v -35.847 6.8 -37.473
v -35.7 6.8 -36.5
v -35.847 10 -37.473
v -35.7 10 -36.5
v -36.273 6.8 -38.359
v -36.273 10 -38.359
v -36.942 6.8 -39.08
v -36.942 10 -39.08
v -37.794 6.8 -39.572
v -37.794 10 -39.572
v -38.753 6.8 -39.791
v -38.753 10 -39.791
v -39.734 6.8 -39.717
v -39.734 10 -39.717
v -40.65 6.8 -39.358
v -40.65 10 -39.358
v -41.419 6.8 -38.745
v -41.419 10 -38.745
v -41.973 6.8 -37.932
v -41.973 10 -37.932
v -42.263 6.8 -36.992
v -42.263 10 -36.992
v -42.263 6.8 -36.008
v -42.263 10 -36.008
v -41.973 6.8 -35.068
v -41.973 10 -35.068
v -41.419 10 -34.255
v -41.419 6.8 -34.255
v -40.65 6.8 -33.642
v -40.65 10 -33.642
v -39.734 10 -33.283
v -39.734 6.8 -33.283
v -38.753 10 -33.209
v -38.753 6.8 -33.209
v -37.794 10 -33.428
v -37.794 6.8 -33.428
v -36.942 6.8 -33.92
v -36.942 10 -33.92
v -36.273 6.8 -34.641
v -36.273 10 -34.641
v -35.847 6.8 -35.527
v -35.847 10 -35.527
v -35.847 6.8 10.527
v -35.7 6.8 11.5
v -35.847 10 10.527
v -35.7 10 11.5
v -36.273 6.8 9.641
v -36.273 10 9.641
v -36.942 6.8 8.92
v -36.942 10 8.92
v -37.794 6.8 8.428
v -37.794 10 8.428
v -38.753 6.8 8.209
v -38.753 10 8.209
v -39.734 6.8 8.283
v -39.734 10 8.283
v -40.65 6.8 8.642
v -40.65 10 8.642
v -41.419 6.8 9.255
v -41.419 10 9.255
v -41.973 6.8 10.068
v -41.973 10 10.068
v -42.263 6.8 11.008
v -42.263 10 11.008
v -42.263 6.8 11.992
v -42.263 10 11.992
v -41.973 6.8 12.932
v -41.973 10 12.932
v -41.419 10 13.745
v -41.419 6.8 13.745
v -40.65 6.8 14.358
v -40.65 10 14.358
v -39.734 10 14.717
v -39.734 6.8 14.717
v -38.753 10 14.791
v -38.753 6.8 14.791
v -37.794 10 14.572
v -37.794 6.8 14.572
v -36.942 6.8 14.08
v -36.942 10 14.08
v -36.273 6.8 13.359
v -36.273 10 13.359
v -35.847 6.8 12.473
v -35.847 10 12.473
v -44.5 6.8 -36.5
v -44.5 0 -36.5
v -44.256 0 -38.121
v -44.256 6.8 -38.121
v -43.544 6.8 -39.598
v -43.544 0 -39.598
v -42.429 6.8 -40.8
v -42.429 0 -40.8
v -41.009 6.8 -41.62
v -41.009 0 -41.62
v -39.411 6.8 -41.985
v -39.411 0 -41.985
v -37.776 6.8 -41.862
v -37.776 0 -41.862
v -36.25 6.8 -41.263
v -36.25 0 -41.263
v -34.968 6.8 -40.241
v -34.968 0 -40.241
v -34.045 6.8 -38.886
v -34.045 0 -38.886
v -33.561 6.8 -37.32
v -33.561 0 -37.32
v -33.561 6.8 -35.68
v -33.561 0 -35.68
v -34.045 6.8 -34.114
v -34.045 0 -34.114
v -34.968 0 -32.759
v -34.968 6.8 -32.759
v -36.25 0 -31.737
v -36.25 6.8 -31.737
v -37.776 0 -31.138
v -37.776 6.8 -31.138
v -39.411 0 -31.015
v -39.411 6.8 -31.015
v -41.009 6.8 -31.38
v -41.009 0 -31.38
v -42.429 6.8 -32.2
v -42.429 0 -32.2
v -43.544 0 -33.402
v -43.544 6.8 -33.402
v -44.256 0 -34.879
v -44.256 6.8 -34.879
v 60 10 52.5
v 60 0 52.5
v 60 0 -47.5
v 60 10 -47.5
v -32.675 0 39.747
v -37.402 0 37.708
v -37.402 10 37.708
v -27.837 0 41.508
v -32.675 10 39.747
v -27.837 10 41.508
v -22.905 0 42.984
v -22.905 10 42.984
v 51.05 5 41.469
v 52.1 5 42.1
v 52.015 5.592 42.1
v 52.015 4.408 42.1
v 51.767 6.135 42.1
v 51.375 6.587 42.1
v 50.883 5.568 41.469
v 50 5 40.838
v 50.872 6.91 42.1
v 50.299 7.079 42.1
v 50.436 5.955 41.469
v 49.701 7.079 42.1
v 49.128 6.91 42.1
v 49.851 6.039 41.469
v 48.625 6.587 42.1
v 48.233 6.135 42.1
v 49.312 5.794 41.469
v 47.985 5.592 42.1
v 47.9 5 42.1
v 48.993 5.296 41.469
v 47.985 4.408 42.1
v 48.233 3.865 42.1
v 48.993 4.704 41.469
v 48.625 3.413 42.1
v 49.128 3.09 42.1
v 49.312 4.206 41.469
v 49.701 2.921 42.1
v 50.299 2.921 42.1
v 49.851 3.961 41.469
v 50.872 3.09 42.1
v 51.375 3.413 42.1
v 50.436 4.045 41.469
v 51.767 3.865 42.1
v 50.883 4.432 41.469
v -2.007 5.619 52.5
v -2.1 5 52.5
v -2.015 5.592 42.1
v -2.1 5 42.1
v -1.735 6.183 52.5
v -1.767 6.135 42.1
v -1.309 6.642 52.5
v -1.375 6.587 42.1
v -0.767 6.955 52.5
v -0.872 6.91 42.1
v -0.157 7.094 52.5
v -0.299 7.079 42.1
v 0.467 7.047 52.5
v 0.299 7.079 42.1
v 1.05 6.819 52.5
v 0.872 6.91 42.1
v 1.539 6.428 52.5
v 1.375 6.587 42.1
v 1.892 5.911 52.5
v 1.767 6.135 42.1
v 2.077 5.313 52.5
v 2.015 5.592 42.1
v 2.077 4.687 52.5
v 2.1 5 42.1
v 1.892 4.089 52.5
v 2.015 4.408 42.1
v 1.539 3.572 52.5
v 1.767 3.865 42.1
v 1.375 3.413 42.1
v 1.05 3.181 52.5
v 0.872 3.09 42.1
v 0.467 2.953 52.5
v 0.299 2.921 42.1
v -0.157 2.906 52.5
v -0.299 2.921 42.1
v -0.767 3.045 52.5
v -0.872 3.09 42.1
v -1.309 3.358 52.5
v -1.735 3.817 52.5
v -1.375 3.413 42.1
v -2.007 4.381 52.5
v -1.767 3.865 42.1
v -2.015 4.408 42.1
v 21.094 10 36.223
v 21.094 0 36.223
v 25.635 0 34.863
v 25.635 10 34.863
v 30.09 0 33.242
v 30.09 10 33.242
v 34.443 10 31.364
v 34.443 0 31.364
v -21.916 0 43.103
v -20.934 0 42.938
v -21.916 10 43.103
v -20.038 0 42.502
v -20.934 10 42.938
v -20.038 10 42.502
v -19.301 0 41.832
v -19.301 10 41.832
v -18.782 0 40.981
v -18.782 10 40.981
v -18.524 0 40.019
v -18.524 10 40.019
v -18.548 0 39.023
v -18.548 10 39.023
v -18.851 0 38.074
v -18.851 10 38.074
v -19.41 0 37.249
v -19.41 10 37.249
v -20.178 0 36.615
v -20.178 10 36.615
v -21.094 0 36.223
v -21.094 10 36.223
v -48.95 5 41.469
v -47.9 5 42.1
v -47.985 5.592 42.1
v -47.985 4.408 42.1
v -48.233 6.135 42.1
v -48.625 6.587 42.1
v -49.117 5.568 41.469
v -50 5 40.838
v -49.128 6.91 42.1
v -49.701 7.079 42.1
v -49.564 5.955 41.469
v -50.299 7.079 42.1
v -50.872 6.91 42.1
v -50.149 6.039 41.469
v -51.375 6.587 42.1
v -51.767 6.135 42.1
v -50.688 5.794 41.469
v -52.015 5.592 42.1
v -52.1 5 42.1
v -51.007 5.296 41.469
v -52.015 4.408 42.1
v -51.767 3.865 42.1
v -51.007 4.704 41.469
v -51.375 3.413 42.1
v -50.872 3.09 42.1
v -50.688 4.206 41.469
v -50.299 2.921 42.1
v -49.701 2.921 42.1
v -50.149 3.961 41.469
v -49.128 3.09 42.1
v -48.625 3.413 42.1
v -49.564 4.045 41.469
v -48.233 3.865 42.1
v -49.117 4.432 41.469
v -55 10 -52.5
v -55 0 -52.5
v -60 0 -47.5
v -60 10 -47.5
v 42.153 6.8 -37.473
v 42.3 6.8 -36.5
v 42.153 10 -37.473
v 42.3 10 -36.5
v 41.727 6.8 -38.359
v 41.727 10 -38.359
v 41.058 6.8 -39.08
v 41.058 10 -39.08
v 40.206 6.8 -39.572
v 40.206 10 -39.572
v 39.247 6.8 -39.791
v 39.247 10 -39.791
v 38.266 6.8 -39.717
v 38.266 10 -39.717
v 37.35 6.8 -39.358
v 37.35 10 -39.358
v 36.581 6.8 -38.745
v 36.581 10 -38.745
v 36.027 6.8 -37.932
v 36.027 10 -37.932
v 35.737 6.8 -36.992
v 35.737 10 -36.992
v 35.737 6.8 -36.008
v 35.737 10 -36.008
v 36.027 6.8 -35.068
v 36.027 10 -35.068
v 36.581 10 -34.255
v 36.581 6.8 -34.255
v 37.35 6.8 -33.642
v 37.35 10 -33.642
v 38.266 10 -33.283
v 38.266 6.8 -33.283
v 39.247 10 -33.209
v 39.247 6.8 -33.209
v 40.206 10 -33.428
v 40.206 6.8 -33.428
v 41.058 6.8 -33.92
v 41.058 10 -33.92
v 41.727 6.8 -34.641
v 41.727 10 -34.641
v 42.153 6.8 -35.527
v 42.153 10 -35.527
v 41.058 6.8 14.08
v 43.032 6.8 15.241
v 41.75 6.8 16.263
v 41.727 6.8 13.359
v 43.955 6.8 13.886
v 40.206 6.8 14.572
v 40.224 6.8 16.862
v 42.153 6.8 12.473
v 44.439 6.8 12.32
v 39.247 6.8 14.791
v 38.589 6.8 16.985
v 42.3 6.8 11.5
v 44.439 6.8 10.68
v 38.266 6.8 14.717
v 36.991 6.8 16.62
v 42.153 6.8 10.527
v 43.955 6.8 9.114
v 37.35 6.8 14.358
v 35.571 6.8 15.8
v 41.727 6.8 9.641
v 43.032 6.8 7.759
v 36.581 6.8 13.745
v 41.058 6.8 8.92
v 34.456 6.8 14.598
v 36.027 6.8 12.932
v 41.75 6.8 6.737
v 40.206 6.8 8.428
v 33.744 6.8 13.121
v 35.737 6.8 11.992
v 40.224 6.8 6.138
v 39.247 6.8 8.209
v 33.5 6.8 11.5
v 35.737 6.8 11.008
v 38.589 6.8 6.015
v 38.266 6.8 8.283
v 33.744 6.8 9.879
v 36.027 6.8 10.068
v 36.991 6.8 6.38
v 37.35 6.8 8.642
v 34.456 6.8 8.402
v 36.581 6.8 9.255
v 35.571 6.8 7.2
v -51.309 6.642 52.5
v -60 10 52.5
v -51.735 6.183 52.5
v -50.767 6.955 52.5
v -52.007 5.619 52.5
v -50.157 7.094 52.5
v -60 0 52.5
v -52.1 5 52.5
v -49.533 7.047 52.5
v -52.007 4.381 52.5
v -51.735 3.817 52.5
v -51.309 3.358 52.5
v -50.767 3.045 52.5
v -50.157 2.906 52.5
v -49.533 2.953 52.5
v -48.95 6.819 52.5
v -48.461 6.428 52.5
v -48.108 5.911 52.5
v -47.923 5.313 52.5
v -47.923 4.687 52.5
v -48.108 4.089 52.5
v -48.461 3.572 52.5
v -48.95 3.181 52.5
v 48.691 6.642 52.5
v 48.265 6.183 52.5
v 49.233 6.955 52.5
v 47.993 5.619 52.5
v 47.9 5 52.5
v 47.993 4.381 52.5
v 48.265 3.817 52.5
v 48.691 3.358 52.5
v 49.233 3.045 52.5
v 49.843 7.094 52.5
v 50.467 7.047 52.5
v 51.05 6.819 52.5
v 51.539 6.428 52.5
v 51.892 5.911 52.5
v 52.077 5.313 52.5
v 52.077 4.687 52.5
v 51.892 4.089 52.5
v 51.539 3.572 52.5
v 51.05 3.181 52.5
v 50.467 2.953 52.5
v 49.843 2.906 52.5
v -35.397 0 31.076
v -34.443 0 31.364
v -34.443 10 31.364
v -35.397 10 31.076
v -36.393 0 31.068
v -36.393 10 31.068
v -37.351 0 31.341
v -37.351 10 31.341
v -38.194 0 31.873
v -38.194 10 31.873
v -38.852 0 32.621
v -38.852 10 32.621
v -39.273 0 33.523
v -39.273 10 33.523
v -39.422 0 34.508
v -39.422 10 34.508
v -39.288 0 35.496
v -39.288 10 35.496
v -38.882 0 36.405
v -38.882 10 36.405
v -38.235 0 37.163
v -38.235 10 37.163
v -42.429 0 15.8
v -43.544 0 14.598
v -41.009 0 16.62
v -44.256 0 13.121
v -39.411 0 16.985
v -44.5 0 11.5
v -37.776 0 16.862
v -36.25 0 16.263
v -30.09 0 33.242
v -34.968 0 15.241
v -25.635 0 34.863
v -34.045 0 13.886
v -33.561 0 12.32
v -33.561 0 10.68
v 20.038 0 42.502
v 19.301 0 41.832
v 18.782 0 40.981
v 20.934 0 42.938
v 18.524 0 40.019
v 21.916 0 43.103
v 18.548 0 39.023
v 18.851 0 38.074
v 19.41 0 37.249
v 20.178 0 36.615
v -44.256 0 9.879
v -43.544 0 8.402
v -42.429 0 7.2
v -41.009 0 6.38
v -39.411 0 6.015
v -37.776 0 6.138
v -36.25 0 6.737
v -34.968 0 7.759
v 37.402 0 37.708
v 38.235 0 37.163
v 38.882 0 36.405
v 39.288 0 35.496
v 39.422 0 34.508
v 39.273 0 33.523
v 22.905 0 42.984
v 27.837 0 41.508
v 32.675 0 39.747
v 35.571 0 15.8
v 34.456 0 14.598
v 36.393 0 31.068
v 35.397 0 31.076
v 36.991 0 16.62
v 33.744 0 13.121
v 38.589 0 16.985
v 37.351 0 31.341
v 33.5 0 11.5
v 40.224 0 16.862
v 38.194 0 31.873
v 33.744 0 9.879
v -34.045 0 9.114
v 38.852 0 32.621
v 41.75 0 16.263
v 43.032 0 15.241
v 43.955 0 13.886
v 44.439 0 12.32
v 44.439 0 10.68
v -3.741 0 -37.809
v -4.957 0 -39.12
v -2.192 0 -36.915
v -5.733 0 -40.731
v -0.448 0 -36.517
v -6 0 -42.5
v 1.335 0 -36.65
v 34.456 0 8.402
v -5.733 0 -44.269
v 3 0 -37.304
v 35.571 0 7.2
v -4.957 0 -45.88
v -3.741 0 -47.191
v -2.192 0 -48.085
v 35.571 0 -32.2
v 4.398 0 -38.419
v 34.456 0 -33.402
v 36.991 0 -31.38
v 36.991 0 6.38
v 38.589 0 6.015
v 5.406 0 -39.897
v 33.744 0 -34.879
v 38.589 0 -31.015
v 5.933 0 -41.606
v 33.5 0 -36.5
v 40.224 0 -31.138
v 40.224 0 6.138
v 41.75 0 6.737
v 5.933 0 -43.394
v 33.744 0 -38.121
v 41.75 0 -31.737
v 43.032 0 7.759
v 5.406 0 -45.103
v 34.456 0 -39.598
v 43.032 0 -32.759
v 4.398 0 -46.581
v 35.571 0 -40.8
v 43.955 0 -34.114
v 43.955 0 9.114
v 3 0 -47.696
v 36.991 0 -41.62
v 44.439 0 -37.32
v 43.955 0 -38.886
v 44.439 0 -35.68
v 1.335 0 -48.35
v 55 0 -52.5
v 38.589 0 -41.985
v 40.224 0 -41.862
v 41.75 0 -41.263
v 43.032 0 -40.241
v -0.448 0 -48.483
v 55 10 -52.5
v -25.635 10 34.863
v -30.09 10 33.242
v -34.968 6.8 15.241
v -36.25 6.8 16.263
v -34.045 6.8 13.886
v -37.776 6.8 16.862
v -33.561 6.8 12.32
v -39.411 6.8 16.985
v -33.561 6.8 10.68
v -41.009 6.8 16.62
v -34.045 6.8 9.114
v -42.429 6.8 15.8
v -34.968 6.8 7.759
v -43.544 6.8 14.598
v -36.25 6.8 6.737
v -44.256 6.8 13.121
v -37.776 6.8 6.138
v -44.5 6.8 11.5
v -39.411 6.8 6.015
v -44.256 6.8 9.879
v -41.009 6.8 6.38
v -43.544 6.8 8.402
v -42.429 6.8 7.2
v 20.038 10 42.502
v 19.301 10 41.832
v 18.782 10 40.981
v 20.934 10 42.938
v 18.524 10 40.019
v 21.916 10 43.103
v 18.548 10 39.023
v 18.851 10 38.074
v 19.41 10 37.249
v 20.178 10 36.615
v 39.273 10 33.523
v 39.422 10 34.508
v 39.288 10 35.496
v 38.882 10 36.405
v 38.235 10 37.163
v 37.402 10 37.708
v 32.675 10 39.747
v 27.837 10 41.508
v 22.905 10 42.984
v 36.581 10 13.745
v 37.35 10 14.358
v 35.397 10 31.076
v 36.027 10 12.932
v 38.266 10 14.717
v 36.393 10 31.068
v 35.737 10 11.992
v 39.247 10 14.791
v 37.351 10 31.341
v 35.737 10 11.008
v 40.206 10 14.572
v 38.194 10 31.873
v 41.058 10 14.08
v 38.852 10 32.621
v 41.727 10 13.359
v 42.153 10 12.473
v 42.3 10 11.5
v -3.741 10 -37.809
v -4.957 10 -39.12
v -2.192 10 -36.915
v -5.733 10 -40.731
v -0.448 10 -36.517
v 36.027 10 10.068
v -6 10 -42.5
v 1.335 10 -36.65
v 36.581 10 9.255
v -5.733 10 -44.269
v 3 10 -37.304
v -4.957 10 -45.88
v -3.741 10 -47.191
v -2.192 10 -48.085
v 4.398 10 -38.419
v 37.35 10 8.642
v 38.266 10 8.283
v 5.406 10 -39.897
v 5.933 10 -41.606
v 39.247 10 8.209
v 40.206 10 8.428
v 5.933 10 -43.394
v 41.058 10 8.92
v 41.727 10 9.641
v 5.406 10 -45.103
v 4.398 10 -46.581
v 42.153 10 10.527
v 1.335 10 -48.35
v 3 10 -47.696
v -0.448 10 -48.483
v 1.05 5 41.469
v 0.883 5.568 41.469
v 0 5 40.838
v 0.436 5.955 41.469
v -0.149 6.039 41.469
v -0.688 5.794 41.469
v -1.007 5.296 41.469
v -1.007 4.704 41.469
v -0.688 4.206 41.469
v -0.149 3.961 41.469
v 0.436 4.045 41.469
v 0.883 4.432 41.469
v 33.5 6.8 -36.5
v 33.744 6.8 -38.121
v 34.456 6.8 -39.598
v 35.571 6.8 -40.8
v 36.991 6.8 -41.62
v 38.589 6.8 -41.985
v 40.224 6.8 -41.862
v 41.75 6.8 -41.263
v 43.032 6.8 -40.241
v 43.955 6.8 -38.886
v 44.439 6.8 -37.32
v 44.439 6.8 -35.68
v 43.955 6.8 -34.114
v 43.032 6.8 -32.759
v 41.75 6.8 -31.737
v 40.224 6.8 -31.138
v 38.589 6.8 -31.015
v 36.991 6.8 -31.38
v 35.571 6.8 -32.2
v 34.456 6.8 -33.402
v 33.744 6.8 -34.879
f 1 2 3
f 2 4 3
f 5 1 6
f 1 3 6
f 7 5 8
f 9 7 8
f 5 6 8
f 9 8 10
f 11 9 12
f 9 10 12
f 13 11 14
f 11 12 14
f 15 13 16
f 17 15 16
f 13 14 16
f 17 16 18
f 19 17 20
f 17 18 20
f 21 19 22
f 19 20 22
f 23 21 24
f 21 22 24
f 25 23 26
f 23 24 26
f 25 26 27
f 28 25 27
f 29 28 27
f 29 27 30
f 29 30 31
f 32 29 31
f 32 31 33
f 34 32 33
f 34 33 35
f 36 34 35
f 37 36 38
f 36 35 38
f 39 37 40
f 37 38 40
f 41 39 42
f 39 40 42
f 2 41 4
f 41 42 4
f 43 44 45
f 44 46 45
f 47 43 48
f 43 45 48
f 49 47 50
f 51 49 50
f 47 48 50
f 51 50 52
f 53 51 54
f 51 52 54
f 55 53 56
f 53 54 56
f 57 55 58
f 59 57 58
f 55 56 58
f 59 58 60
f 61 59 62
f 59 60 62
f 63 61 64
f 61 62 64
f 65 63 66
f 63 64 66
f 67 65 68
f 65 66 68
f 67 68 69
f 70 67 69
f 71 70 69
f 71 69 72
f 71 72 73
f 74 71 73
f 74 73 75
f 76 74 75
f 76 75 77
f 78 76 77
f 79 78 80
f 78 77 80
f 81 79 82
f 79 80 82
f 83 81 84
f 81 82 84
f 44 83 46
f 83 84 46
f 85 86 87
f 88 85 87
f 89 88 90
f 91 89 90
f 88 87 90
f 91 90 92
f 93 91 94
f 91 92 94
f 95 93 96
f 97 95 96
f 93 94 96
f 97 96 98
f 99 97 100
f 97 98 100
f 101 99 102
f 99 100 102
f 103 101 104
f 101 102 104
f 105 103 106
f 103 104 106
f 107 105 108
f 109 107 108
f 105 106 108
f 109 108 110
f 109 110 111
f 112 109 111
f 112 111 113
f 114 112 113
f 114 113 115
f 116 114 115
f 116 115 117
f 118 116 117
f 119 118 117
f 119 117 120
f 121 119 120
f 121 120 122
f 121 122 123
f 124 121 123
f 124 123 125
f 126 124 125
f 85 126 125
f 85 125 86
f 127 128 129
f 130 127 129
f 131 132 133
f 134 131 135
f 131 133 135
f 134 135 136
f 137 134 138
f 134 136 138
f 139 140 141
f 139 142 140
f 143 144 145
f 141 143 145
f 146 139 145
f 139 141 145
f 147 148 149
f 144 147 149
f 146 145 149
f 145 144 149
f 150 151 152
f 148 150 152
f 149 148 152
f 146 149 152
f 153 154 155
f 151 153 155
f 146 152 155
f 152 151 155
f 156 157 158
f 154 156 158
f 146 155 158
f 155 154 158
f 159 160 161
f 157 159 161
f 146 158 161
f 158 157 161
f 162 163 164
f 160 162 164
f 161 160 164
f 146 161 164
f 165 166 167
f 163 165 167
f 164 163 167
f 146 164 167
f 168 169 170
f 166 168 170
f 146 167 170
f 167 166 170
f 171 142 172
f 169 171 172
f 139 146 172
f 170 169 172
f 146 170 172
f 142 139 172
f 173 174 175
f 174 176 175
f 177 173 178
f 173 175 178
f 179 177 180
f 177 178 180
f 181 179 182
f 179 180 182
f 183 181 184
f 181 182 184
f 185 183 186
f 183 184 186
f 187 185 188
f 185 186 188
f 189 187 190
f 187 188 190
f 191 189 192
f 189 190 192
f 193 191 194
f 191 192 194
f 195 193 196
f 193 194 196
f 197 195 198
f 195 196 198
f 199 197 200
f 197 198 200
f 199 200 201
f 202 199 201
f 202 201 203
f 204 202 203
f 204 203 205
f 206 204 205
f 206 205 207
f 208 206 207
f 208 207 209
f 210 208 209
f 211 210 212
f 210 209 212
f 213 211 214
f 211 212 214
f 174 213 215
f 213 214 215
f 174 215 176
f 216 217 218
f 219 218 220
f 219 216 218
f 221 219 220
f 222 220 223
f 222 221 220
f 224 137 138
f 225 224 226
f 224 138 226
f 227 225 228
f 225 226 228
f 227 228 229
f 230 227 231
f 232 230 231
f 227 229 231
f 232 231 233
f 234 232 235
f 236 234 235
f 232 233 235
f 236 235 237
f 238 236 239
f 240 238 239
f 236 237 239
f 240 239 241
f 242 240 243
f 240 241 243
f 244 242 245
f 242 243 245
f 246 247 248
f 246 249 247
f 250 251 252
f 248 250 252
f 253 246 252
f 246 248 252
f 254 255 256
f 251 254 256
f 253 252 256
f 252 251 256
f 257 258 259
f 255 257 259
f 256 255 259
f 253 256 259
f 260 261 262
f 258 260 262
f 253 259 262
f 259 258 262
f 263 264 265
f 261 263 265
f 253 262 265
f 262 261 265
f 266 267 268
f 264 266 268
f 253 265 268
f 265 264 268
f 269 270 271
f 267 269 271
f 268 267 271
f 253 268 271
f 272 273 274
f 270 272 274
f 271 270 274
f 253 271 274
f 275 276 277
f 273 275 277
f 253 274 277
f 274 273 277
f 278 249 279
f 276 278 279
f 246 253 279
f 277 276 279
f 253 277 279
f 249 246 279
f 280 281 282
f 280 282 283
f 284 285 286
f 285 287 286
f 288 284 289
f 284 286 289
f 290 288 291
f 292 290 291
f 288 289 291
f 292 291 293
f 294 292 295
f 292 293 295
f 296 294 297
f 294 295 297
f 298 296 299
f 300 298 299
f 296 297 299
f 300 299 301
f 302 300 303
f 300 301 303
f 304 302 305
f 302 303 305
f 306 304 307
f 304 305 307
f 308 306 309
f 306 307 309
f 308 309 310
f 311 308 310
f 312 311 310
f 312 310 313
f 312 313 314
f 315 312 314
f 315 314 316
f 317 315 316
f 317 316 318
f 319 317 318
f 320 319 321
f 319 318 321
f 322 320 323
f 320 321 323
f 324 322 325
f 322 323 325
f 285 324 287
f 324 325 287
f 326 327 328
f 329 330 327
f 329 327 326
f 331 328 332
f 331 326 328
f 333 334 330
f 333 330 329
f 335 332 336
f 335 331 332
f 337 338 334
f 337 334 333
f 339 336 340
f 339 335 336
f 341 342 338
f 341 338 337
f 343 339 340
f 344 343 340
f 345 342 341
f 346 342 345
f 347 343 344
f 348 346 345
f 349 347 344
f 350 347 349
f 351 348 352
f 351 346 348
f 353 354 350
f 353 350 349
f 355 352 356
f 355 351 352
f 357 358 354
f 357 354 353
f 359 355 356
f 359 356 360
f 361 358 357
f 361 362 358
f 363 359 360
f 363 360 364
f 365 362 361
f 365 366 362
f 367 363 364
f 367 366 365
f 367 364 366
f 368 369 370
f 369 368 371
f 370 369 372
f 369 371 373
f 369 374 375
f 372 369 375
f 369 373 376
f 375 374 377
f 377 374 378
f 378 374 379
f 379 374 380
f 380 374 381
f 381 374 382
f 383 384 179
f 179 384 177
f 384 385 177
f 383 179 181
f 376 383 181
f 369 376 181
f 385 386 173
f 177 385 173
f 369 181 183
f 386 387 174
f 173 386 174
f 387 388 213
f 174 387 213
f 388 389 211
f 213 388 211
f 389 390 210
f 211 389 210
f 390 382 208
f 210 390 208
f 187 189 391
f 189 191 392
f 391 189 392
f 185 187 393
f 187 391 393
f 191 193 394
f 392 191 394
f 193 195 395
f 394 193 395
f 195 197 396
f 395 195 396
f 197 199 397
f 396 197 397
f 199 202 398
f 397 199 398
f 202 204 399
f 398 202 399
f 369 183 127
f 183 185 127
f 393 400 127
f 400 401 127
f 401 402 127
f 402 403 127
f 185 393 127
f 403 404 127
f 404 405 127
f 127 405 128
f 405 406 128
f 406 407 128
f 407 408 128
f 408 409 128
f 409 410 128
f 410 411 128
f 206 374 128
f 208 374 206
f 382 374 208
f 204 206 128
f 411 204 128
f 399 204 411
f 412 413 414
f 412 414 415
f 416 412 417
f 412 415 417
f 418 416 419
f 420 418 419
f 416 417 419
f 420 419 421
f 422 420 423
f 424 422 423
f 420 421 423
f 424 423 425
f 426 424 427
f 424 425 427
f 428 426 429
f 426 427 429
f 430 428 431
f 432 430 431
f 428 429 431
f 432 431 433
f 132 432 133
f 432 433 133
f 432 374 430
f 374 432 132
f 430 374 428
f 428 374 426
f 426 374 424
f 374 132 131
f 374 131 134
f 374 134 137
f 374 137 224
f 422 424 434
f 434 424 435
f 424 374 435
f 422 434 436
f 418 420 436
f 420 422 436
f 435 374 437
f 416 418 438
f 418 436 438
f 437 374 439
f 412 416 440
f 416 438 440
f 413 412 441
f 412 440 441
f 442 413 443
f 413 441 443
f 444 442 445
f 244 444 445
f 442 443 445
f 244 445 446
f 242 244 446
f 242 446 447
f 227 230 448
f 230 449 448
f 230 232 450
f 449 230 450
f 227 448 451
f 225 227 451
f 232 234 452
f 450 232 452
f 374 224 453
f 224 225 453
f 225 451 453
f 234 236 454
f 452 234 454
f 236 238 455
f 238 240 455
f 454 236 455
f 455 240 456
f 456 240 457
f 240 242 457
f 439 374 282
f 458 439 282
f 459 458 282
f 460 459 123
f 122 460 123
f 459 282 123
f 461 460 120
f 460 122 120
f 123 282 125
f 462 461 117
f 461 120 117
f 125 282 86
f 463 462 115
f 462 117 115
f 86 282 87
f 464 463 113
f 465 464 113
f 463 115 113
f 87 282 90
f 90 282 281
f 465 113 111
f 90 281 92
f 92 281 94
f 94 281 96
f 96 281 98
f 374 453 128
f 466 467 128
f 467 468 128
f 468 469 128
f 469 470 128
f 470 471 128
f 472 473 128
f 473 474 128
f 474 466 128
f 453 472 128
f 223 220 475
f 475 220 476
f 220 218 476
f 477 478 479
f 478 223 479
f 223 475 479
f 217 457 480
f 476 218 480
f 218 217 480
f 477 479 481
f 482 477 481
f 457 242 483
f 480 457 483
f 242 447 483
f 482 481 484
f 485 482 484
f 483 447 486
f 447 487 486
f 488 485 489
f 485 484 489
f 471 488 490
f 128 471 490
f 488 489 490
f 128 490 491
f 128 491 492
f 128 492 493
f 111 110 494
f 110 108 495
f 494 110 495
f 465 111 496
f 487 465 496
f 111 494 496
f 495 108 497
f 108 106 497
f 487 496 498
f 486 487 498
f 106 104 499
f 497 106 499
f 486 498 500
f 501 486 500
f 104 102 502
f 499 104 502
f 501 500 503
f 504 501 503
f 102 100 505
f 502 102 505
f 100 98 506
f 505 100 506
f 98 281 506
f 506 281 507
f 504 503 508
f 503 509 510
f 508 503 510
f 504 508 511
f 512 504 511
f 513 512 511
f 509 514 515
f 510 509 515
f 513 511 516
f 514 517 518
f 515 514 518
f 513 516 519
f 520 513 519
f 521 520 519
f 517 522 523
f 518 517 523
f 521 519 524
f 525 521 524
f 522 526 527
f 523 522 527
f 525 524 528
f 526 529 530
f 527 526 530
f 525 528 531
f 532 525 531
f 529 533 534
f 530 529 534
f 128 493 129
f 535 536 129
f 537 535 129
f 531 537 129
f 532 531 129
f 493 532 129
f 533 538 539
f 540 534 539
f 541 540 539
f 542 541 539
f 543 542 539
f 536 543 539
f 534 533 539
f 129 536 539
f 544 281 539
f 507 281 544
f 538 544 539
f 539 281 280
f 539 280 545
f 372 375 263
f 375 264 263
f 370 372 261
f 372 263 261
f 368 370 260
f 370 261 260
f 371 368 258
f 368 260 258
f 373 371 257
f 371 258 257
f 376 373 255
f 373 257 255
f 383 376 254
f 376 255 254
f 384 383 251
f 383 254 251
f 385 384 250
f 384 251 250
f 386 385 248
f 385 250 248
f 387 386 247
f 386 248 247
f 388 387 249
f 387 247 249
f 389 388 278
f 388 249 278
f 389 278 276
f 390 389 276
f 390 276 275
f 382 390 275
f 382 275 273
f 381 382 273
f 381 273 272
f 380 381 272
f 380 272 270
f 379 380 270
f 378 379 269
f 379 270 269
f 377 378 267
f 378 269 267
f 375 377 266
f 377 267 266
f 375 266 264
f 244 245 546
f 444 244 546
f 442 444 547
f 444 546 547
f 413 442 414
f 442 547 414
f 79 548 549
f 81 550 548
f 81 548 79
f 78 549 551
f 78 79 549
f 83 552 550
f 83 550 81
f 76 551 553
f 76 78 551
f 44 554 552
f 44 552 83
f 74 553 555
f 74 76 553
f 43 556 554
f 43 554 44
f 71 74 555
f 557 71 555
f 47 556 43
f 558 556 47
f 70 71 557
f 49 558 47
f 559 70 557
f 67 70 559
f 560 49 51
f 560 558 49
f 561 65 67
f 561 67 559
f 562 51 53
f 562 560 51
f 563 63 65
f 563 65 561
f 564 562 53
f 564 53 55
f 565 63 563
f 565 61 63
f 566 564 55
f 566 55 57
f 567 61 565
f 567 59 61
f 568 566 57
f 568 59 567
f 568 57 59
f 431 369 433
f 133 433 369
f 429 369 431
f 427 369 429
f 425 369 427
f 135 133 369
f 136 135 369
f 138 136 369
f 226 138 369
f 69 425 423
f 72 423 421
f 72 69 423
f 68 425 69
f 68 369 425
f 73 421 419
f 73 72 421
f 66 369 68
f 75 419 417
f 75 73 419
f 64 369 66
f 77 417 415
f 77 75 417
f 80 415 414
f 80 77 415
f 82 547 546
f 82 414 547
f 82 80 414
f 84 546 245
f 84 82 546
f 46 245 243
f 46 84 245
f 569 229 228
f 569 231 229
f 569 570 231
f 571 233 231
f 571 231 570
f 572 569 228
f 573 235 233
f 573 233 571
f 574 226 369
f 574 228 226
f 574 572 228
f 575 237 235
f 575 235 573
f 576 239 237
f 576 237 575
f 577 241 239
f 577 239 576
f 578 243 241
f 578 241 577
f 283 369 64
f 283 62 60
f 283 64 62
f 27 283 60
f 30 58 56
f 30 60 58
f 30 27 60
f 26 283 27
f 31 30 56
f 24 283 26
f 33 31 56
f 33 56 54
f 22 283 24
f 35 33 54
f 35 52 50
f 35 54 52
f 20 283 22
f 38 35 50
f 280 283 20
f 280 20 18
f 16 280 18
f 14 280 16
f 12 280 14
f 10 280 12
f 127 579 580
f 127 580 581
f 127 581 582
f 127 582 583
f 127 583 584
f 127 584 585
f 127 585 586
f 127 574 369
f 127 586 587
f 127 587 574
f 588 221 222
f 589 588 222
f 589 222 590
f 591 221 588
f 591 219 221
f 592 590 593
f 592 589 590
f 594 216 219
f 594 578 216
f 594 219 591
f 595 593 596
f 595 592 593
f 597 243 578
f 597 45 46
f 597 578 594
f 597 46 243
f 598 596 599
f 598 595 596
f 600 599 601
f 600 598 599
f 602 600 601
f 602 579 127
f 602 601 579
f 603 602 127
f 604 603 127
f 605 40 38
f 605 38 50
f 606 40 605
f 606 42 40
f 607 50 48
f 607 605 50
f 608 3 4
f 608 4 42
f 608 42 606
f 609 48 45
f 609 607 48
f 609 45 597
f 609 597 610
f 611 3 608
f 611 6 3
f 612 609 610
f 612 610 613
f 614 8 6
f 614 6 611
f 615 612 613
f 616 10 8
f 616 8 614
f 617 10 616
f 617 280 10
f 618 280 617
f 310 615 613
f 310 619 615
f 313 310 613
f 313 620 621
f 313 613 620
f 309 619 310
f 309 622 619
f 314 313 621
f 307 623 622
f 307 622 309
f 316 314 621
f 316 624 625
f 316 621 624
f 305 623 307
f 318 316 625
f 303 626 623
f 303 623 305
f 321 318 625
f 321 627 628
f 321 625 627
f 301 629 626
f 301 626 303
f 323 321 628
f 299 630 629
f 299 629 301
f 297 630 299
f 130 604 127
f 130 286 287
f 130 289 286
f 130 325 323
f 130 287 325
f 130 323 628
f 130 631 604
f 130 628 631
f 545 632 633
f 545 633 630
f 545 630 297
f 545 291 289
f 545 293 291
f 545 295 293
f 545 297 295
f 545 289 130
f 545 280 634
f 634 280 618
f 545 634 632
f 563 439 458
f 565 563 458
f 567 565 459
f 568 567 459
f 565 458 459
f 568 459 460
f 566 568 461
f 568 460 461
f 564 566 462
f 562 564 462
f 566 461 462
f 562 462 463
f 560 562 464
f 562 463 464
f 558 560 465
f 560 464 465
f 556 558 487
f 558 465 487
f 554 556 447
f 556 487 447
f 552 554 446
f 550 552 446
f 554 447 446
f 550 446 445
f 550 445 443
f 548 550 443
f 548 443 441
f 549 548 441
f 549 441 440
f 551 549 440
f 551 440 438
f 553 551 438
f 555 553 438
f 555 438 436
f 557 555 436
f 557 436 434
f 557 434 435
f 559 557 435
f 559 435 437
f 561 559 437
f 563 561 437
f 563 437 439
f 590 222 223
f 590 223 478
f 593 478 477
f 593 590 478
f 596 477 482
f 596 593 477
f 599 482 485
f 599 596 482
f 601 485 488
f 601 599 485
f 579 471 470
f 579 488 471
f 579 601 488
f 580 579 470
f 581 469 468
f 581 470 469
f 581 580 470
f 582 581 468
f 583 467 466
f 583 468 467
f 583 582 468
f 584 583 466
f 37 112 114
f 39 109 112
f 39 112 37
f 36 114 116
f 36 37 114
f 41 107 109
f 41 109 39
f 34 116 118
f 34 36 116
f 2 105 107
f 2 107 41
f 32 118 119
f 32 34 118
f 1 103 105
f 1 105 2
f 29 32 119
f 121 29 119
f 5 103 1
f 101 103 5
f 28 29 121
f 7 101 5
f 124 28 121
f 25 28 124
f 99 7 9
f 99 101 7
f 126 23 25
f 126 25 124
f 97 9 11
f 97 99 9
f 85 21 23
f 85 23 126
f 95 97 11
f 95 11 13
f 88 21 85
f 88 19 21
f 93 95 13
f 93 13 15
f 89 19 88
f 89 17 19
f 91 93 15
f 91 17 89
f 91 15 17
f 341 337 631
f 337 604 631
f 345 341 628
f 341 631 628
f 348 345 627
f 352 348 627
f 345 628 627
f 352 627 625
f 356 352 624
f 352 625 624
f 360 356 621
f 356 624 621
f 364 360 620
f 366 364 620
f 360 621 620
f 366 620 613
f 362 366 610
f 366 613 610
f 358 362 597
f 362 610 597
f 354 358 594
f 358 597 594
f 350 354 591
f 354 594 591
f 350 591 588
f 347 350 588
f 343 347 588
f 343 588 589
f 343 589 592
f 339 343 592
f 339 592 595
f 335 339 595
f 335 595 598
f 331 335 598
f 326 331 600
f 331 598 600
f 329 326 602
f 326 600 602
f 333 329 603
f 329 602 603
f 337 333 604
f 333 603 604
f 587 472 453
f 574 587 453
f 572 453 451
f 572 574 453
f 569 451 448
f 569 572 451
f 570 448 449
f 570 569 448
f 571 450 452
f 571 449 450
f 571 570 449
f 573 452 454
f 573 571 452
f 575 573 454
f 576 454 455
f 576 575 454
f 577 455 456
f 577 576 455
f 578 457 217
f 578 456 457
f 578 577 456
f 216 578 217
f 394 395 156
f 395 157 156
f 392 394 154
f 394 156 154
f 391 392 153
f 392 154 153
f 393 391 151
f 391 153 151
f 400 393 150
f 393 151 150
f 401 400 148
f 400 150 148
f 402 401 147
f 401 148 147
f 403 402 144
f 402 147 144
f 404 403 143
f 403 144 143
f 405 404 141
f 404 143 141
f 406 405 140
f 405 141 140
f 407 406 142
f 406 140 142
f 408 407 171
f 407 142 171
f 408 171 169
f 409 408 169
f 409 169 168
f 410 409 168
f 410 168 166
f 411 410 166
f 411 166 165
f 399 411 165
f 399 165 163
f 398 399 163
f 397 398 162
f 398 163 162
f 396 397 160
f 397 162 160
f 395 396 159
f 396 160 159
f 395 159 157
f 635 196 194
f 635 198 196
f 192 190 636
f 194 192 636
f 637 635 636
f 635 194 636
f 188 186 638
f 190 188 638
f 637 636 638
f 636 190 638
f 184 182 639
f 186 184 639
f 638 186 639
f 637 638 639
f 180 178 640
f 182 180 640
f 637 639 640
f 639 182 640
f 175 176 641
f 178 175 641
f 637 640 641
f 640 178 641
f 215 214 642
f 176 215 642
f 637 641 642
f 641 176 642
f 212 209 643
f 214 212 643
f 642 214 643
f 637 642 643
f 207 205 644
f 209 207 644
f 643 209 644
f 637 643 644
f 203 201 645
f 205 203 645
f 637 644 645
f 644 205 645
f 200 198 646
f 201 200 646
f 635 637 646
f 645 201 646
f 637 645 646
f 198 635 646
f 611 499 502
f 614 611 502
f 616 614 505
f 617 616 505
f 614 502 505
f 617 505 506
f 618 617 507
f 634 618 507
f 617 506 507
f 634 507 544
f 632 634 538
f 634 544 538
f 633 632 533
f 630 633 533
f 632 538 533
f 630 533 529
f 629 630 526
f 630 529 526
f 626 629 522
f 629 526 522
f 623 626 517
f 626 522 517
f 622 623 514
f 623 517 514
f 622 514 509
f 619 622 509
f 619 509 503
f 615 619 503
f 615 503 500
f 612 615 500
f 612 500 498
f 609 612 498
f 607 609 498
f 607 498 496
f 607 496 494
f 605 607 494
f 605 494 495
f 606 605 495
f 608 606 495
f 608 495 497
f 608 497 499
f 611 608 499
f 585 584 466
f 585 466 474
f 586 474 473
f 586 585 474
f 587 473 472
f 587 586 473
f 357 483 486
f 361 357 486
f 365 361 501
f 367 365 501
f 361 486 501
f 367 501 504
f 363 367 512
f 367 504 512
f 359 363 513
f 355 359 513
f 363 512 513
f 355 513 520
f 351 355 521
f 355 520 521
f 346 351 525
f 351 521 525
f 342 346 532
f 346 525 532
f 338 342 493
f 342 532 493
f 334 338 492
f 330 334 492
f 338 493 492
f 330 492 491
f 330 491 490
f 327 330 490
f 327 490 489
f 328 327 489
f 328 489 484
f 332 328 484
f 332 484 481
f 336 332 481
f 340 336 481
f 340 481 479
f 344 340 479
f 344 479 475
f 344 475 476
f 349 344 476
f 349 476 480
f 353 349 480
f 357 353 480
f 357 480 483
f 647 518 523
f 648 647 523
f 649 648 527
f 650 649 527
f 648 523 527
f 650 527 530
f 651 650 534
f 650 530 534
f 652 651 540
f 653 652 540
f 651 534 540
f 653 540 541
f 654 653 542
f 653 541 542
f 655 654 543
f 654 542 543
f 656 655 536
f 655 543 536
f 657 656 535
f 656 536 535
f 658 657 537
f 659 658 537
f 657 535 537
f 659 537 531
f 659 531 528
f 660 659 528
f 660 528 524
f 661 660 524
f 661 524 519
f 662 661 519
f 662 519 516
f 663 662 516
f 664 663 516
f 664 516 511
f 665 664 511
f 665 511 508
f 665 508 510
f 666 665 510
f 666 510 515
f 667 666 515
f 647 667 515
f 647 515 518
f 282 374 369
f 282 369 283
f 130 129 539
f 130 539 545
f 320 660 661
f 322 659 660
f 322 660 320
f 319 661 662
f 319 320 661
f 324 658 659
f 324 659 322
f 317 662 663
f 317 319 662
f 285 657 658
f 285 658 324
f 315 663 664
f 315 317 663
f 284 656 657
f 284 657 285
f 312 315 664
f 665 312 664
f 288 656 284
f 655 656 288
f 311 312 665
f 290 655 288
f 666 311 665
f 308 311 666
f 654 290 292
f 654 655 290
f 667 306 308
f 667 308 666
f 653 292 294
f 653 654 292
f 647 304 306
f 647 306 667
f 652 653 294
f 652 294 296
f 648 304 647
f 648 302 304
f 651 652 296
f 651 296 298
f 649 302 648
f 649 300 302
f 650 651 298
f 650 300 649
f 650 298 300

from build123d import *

# Parameters (mm, degrees)
SKETCH_1_W                = 120
SKETCH_1_H                = 105
EXTRUDE_1_DEPTH           = 10
HOLE_WIZARD_1_D           = 6.6
HOLE_WIZARD_1_CBORE_D     = 11
HOLE_WIZARD_1_CBORE_DEPTH = 6.8
HOLE_WIZARD_1_2_D         = 12
CUT_EXTRUDE_2_REACH       = 82.351
HOLE_WIZARD_M5_1_D        = 4.2
HOLE_WIZARD_M5_1_DEPTH    = 10.4
HOLE_WIZARD_M5_1_TIP      = 1.2618073
CHAMFER_1_SIZE            = 5


with BuildPart() as part:
    # 草图1 → 凸台-拉伸1 (new body)
    with BuildSketch(Plane(origin=(0, 0, 0), x_dir=(1, 0, 0), z_dir=(0, 1, 0))):
        Rectangle(SKETCH_1_W, SKETCH_1_H)
    extrude(amount=EXTRUDE_1_DEPTH)

    # Hole Wizard 1 (through all)
    with Locations(Plane(origin=(0, 0, 0), x_dir=(-1, 0, 0), z_dir=(0, -1, 0))):
        with Locations((39, -11.5), (-39, -11.5), (-39, 36.5), (39, 36.5)):
            CounterBoreHole(HOLE_WIZARD_1_D / 2, HOLE_WIZARD_1_CBORE_D / 2, HOLE_WIZARD_1_CBORE_DEPTH)

    # Hole Wizard 1 2 (through all)
    with Locations(Plane(origin=(0, 10, 0), x_dir=(1, 0, 0), z_dir=(0, 1, 0))):
        with Locations((0, 42.5)):
            Hole(HOLE_WIZARD_1_2_D / 2)

    # 草图7 → 切除-拉伸2 (cut, up to next)
    with BuildSketch(Plane(origin=(0, 10, 0), x_dir=(1, 0, 0), z_dir=(0, 1, 0)), mode=Mode.PRIVATE) as cut_extrude_2_sk1:
        with BuildLine():
            ThreePointArc((-37.401716164, -37.708239153), (-30.268782684, -40.66279694), (-22.905485492, -42.984435627))
            ThreePointArc((-22.905485492, -42.984435627), (-18.618878442, -40.509561892), (-21.093752176, -36.222954843))
            ThreePointArc((-21.093752176, -36.222954843), (-27.874641681, -34.084948594), (-34.443388332, -31.364084643))
            ThreePointArc((-34.443388332, -31.364084643), (-39.094629503, -33.056997982), (-37.401716164, -37.708239153))
        make_face()
    cut_extrude_2_tool1 = extrude(cut_extrude_2_sk1.sketch, amount=-CUT_EXTRUDE_2_REACH, mode=Mode.PRIVATE) & part.part
    # 草图7 → 切除-拉伸2 (cut, up to next)
    with BuildSketch(Plane(origin=(0, 10, 0), x_dir=(1, 0, 0), z_dir=(0, 1, 0)), mode=Mode.PRIVATE) as cut_extrude_2_sk2:
        with BuildLine():
            ThreePointArc((34.443388332, -31.364084643), (39.094629503, -33.056997982), (37.401716164, -37.708239153))
            ThreePointArc((37.401716164, -37.708239153), (30.268782684, -40.66279694), (22.905485492, -42.984435627))
            ThreePointArc((22.905485492, -42.984435627), (18.618878442, -40.509561892), (21.093752176, -36.222954843))
            ThreePointArc((21.093752176, -36.222954843), (27.874641681, -34.084948594), (34.443388332, -31.364084643))
        make_face()
    cut_extrude_2_tool2 = extrude(cut_extrude_2_sk2.sketch, amount=-CUT_EXTRUDE_2_REACH, mode=Mode.PRIVATE) & part.part
    add(cut_extrude_2_tool1.solids().sort_by_distance((-29.014889, 10, 37.217751))[0], mode=Mode.SUBTRACT)
    add(cut_extrude_2_tool2.solids().sort_by_distance((29.014889, 10, 37.217751))[0], mode=Mode.SUBTRACT)

    # M5 螺纹孔1
    with Locations(Plane(origin=(-19.270259274, 3.138381988, 52.5), x_dir=(1, 0, 0), z_dir=(0, 0, 1))):
        with Locations((-30.729740726, 1.861618012), (69.270259274, 1.861618012), (19.270259274, 1.861618012)):
            Hole(HOLE_WIZARD_M5_1_D / 2, depth=HOLE_WIZARD_M5_1_DEPTH)
            with Locations((0, 0, -(HOLE_WIZARD_M5_1_DEPTH + HOLE_WIZARD_M5_1_TIP / 2))):  # 118° drill point
                Cone(0, HOLE_WIZARD_M5_1_D / 2, HOLE_WIZARD_M5_1_TIP, mode=Mode.SUBTRACT)

    # 倒角1
    chamfer_1_edges = [part.edges().sort_by_distance(p)[0] for p in [
        (-60, 5, -52.5),
        (60, 5, -52.5),
    ]]
    chamfer(chamfer_1_edges, length=CHAMFER_1_SIZE)


solid = part.part
